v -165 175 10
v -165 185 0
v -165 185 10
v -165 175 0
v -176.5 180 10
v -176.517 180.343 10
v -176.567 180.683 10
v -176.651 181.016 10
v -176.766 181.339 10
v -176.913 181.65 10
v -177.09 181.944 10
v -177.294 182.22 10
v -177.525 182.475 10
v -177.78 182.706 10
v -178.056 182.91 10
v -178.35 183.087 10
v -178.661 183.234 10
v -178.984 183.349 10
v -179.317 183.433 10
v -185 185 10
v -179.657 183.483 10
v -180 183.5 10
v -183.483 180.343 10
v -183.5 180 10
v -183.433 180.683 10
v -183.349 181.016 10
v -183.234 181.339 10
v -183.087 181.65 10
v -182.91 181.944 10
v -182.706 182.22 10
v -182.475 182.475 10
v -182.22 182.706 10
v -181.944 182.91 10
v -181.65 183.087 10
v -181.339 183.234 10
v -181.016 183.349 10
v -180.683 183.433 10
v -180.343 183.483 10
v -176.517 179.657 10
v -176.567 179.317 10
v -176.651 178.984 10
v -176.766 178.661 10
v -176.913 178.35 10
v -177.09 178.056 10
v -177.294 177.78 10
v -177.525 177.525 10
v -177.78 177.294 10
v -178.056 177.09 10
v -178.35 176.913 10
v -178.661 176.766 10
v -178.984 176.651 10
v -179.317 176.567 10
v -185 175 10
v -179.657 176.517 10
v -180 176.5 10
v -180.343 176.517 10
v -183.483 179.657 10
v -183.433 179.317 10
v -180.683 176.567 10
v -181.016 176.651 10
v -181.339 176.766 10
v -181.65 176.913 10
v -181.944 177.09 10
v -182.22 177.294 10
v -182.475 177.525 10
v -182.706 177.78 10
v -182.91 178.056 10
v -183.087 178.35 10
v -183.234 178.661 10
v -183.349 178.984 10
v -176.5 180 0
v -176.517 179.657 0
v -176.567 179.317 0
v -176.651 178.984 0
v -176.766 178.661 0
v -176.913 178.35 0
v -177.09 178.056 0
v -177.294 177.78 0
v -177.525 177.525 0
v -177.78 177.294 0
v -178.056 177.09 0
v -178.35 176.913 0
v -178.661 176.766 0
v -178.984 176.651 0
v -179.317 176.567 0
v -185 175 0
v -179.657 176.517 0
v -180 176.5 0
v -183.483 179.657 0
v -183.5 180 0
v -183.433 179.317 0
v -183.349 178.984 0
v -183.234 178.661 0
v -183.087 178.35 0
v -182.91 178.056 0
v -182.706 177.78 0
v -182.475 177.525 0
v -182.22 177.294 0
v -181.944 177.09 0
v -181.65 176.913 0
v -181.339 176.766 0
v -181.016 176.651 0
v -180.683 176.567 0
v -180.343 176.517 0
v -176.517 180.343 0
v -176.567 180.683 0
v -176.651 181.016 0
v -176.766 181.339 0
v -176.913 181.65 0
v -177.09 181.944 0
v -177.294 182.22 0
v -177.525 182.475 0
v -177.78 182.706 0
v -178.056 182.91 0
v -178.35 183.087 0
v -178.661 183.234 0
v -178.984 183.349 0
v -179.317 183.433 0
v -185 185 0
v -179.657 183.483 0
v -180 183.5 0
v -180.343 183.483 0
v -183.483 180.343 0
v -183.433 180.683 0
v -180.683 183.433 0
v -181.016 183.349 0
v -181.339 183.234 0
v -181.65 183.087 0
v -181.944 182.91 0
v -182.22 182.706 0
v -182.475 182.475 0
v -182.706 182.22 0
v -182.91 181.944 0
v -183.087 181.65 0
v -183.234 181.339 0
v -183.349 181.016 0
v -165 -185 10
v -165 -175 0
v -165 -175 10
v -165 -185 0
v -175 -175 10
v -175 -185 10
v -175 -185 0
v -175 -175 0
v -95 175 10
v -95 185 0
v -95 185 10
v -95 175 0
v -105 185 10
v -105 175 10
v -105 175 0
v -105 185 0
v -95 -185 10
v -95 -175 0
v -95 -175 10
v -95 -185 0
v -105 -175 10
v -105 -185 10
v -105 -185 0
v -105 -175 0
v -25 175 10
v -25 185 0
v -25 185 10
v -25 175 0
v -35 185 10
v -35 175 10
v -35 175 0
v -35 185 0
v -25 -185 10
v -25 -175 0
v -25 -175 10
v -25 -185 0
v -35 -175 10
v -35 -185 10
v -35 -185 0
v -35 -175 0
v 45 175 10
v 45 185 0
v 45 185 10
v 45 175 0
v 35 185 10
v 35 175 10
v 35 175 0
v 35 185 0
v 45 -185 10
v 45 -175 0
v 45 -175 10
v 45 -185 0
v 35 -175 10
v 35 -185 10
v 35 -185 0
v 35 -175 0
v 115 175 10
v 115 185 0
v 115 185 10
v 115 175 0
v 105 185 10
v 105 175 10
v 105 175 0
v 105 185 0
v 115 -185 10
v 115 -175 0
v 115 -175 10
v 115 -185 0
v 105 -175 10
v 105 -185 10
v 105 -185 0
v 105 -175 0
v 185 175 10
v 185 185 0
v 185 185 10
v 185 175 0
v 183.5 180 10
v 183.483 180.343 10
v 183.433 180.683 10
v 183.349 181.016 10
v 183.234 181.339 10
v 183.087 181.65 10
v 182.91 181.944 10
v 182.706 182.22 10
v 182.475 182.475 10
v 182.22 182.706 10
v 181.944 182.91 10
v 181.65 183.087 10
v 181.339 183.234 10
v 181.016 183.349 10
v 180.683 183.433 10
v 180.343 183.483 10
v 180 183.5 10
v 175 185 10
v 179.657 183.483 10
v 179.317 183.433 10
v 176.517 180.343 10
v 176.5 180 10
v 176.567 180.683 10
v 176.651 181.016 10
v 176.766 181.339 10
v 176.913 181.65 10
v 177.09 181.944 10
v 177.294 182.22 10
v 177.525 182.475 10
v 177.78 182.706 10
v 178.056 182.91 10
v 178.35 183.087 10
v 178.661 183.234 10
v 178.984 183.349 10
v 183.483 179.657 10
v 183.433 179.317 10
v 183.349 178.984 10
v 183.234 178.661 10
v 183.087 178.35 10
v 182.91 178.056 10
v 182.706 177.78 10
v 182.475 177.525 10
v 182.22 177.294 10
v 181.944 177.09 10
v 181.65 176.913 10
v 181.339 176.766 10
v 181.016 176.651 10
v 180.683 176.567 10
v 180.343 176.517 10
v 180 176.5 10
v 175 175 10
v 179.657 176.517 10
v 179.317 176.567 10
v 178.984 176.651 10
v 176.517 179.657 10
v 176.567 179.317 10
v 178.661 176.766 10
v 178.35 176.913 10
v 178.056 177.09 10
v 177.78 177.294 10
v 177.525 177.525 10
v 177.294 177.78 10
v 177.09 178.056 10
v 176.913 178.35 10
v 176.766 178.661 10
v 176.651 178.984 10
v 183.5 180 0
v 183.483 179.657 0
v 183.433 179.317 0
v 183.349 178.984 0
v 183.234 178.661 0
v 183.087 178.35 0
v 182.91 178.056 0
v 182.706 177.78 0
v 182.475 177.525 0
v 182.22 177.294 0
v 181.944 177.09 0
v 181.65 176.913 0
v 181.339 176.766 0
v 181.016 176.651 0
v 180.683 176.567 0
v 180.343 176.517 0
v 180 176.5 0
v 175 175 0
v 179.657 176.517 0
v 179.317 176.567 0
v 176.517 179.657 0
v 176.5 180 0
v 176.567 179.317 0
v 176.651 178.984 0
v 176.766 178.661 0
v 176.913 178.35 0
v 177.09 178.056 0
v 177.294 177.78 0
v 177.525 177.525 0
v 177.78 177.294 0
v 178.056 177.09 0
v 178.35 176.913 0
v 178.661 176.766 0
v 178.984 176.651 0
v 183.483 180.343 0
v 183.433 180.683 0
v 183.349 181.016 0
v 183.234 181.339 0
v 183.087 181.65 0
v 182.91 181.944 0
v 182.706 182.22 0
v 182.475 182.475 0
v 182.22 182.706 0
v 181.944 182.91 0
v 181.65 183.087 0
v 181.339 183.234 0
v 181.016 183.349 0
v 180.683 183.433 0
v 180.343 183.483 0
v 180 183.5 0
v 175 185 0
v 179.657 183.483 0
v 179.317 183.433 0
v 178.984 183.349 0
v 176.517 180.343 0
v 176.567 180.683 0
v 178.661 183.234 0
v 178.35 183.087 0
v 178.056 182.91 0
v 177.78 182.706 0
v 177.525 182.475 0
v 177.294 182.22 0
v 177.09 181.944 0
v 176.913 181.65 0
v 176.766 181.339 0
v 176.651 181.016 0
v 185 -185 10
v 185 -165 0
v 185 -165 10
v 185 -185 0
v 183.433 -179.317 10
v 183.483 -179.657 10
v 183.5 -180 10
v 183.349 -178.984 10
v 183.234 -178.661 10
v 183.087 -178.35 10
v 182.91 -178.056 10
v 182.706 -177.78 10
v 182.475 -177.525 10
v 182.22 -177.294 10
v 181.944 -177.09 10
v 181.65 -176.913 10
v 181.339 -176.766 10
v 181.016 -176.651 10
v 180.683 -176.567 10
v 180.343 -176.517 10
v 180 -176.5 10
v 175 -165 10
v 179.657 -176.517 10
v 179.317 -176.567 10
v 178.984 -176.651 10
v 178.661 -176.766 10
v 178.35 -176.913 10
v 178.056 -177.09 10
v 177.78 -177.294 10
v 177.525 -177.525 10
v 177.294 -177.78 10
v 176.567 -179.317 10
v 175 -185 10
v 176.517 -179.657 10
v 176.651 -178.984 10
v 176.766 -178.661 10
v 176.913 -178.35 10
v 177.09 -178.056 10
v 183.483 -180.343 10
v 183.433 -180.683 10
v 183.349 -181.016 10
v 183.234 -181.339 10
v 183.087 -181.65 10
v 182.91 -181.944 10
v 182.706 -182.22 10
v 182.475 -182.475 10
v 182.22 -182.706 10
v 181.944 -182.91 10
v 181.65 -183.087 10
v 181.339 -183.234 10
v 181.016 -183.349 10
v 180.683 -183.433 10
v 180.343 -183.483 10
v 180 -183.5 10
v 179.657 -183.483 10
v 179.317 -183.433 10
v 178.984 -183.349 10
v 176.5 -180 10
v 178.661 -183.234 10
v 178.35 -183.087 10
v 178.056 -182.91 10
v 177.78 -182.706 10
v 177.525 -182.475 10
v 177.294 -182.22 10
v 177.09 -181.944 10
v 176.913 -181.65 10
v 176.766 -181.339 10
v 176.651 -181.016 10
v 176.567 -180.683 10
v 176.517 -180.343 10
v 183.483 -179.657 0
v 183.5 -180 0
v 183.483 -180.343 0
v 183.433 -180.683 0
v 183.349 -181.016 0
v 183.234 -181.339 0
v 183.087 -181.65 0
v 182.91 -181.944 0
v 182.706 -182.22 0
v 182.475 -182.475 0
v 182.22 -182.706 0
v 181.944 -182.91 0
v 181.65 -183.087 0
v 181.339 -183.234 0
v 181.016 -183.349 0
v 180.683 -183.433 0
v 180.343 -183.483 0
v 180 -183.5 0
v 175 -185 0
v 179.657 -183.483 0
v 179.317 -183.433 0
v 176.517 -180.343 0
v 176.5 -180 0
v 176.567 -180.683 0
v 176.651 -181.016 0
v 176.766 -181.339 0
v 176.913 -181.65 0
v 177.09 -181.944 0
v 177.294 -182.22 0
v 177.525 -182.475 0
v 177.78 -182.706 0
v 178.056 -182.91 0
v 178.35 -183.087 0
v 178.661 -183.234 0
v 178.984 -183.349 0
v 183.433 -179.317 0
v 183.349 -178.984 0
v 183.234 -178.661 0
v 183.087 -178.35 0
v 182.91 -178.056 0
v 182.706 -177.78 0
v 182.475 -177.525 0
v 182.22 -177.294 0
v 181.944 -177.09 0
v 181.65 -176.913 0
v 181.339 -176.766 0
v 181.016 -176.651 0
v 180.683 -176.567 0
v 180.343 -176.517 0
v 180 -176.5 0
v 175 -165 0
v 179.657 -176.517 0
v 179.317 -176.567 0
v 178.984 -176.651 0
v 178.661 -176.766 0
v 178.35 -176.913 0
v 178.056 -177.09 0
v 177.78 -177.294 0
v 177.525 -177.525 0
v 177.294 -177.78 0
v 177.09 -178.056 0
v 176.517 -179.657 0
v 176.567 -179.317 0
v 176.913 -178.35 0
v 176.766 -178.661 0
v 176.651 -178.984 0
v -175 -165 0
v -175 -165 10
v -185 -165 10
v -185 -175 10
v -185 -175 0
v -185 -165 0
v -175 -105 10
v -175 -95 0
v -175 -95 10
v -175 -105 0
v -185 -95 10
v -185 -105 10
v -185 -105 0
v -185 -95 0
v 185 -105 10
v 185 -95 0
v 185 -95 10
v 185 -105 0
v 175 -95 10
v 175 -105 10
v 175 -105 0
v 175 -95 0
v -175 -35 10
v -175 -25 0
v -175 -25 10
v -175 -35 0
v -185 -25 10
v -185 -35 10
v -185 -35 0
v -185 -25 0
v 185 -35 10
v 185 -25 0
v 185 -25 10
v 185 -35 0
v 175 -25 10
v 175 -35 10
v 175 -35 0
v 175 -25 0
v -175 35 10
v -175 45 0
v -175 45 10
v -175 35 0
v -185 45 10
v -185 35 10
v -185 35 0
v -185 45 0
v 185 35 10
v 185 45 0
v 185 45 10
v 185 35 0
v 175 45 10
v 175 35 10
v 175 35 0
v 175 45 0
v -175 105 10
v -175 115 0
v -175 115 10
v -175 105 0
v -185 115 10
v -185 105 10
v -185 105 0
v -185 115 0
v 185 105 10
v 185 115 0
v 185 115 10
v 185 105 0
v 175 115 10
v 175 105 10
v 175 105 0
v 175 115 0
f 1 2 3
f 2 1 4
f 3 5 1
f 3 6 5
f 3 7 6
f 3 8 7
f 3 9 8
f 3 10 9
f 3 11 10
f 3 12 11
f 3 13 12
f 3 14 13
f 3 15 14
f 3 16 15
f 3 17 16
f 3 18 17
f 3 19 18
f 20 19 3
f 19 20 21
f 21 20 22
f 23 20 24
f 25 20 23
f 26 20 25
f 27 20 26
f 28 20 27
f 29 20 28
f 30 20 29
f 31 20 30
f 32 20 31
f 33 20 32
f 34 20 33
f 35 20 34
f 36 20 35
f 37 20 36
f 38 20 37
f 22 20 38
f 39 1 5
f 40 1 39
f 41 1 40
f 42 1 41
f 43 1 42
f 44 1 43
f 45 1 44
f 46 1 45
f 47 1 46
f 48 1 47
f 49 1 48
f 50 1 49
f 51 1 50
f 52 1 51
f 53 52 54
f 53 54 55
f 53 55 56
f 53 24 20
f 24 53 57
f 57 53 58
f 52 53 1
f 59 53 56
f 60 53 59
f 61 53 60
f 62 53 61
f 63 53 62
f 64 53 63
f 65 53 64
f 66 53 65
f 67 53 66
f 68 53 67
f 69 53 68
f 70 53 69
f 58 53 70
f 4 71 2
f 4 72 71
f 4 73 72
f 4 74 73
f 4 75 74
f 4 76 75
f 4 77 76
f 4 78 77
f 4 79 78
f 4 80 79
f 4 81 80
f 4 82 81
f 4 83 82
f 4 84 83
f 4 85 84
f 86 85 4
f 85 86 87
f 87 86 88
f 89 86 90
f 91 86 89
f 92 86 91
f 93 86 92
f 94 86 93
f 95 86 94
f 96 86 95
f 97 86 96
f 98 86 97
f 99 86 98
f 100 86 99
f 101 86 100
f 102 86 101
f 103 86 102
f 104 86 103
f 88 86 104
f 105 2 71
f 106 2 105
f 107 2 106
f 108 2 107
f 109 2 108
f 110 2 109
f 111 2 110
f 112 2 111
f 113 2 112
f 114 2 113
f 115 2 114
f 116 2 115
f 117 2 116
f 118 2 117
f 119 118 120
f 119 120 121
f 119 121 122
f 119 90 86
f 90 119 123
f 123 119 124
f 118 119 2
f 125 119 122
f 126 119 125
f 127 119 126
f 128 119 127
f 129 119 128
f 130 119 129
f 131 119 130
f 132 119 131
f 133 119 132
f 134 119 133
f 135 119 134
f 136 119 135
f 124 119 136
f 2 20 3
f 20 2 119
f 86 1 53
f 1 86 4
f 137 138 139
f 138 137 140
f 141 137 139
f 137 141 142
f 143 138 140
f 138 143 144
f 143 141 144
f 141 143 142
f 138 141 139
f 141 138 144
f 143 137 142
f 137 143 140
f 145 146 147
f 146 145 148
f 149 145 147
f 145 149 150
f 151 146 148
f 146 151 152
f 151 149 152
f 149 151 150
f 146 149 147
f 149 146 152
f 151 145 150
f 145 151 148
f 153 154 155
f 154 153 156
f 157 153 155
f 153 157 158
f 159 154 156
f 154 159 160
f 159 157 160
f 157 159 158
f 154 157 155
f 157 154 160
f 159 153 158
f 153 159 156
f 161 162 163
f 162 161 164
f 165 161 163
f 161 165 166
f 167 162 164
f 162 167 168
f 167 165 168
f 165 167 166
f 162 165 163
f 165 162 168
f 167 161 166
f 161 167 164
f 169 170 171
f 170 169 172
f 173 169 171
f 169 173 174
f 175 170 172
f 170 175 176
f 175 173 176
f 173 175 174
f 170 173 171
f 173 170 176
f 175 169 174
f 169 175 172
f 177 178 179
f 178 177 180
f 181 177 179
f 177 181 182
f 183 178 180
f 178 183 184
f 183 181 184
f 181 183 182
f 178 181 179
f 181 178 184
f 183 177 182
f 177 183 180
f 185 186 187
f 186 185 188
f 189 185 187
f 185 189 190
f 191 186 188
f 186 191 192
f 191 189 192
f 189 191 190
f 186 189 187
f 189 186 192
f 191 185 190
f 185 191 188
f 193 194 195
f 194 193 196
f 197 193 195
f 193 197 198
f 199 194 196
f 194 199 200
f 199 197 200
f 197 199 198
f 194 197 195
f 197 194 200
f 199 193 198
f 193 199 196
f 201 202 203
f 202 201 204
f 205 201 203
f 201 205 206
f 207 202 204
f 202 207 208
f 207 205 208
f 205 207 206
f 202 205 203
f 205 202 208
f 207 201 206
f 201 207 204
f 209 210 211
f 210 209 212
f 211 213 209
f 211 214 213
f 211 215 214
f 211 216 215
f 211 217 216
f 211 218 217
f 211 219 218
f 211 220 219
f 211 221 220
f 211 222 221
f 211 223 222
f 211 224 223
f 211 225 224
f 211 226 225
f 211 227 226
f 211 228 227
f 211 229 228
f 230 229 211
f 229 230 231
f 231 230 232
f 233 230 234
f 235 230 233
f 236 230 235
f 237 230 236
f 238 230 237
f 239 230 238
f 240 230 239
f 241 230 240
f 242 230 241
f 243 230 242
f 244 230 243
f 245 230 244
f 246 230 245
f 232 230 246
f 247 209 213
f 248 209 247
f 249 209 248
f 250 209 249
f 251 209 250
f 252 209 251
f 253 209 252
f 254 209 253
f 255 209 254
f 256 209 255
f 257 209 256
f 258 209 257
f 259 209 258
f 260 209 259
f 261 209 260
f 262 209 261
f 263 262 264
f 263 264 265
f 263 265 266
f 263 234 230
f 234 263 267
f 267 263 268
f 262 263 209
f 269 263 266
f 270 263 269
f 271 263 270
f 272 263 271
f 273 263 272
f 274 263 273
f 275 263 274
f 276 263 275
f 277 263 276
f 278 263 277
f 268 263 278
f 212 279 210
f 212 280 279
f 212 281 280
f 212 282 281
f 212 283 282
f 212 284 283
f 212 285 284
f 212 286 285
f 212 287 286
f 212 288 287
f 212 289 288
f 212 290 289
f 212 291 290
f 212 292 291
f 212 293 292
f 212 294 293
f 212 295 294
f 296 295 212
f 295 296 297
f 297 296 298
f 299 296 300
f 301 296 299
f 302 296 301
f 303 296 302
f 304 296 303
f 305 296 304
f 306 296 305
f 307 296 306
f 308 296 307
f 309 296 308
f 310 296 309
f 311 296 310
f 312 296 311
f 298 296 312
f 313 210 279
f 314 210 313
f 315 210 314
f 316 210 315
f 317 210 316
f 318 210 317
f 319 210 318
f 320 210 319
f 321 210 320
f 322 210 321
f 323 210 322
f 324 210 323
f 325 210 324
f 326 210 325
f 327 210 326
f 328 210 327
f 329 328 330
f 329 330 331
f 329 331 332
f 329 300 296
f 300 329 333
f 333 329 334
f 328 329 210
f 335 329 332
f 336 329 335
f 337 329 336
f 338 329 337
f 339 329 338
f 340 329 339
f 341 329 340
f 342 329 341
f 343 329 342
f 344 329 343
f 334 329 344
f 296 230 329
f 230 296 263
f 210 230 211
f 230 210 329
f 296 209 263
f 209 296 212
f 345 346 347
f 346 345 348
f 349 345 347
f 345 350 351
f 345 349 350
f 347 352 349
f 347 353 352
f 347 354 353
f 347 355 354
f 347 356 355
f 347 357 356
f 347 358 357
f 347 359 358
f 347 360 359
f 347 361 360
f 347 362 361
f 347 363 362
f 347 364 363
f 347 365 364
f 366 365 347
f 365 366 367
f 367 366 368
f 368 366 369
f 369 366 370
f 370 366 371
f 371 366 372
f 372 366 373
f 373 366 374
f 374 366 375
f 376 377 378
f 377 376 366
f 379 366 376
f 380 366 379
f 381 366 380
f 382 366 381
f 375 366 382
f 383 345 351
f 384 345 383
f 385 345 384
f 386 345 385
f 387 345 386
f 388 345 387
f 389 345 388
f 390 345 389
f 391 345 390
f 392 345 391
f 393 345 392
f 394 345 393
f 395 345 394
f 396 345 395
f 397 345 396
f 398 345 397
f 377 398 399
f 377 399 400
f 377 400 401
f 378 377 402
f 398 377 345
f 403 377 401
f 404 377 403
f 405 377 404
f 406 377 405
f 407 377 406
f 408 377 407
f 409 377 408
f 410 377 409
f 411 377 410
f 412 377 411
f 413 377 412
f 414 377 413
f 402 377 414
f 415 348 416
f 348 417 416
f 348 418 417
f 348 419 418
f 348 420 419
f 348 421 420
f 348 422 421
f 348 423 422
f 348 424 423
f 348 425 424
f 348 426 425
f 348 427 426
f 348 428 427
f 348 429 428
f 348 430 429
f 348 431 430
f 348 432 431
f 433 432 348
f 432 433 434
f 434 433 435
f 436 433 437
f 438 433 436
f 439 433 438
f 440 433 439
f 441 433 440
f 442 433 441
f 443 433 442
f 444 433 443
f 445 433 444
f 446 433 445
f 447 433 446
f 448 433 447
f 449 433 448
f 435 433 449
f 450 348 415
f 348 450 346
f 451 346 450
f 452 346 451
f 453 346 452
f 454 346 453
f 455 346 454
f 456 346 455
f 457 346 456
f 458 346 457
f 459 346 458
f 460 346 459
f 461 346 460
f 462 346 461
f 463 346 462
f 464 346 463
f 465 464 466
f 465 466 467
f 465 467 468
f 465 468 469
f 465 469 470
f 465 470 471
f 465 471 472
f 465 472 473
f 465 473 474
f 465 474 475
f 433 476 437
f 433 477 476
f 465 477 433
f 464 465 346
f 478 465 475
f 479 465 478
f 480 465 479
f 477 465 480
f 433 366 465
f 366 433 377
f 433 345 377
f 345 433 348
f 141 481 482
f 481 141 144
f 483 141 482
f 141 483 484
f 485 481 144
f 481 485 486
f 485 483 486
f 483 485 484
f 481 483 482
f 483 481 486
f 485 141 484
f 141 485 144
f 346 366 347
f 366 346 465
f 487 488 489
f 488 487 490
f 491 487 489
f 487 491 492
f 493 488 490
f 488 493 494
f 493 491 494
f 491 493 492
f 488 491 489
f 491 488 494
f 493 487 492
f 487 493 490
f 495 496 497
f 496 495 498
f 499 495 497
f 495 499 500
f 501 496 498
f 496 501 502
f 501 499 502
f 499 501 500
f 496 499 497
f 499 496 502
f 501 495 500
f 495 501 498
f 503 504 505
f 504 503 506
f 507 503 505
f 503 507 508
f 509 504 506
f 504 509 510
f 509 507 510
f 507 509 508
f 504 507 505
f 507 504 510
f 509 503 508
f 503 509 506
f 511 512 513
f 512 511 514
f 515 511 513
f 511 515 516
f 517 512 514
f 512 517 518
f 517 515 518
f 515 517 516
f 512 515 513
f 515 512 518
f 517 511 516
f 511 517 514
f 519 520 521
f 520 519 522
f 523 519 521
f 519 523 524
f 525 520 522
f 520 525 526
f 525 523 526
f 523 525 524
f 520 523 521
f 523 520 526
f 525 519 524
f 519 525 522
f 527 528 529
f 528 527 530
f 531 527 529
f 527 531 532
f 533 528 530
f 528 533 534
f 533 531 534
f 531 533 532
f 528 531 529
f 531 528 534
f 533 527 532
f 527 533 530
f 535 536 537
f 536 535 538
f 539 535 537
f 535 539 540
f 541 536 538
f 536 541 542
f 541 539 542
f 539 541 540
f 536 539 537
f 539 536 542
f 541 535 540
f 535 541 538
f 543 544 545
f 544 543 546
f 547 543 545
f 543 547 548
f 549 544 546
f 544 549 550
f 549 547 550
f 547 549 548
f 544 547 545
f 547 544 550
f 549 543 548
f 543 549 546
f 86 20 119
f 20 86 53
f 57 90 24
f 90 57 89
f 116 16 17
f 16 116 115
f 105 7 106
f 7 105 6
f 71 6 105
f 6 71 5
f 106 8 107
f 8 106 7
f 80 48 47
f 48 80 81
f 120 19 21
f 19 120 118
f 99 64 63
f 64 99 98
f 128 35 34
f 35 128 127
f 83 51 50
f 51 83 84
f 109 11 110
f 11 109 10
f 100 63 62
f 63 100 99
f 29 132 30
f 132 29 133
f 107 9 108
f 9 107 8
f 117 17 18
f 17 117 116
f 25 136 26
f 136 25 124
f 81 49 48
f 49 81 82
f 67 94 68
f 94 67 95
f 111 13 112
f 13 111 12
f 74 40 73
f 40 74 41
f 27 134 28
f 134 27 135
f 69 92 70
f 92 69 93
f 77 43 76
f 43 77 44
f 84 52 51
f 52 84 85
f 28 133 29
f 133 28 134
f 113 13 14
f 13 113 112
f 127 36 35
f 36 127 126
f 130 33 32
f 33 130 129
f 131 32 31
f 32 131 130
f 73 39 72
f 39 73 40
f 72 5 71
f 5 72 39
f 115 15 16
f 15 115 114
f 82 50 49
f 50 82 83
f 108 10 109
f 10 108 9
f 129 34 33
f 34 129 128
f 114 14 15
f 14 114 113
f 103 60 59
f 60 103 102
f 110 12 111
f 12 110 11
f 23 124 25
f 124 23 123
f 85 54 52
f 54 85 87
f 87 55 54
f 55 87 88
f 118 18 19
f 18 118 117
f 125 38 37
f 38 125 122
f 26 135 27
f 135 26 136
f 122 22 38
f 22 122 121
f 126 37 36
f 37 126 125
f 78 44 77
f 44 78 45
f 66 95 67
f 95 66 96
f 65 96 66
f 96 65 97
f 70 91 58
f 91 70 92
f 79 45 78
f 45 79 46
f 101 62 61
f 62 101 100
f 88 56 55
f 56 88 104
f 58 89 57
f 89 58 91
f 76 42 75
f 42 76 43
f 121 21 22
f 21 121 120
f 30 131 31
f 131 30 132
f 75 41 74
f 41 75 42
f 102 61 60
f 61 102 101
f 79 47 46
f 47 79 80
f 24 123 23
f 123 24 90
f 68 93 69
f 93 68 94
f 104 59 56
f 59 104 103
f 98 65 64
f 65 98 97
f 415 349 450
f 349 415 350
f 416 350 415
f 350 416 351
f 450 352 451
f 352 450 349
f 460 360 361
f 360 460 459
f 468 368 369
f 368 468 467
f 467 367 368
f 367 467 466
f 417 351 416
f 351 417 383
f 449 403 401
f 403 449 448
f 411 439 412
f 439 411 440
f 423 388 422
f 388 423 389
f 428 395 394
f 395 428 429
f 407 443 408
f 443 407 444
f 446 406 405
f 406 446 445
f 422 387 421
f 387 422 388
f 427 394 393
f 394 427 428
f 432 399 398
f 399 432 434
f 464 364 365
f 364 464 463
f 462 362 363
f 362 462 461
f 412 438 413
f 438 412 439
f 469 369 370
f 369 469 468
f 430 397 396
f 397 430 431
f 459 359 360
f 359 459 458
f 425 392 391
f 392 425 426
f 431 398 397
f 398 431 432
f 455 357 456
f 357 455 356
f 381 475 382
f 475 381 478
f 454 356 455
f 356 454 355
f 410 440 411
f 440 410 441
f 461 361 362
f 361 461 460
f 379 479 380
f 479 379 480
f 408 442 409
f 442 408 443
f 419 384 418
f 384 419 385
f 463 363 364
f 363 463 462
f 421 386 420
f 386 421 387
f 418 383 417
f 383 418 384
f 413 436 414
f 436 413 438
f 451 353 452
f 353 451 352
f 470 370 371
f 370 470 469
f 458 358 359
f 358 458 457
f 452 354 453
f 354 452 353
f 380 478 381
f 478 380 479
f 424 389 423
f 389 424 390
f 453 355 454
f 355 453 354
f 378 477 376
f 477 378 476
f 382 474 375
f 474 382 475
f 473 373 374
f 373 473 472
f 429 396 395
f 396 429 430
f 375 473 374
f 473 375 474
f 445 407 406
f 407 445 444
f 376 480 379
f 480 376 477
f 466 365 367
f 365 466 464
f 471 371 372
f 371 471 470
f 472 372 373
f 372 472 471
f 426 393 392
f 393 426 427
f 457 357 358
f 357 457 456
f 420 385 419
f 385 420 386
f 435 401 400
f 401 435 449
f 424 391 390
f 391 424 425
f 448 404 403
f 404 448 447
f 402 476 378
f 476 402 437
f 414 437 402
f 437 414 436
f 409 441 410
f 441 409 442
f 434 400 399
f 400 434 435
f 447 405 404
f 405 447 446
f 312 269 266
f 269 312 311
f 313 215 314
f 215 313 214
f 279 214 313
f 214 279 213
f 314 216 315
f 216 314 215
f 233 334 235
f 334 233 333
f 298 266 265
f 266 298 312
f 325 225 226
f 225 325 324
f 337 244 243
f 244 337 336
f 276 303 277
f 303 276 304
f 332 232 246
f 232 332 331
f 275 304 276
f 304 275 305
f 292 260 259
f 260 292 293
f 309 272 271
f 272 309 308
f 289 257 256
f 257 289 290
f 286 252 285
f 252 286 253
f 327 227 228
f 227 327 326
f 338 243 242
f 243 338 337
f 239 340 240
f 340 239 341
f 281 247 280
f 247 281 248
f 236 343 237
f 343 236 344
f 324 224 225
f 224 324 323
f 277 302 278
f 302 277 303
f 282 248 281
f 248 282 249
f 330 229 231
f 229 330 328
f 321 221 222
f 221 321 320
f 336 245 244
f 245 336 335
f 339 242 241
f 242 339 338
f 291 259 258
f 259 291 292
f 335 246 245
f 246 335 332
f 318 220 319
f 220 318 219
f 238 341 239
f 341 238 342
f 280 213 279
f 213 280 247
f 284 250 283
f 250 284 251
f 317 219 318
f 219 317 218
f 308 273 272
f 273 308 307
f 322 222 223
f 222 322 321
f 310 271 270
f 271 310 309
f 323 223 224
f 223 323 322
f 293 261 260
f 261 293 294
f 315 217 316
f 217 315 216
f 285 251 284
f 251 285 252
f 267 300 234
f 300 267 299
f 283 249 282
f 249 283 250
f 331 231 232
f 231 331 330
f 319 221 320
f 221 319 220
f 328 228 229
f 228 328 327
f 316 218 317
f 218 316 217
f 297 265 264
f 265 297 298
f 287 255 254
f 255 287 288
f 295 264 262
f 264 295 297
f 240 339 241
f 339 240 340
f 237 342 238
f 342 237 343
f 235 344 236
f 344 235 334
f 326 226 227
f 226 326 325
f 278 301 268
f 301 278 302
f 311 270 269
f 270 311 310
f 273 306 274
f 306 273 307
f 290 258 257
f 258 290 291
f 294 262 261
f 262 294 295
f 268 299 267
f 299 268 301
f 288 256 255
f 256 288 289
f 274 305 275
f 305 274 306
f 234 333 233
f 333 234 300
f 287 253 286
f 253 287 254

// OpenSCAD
// ring_35.scad - ring index 35 (z bottom = 350 mm)
$fn = 64; bar = 10; half_b = bar/2; outer = 370; half_outer = outer/2;
front_y = 180; back_y = -180; left_x = -180; right_x = 180;
x_centers = [-170, -100, -30, 40, 110, 180];
z_centers = [5, 85, 155, 225, 295, 365, 435, 505, 575, 645, 715]; ring_z = 350;
module place_box(cx, cy, sx, sy) { translate([cx - sx/2, cy - sy/2, 0]) cube([sx, sy, bar]); }

difference() { union() {
    for (x = x_centers) { place_box(x, front_y, bar, bar); place_box(x, back_y, bar, bar); }
    for (y = x_centers) { place_box(left_x, y, bar, bar); place_box(right_x, y, bar, bar); }
    for (zc = z_centers) if ((zc - half_b < ring_z + bar) && (zc + half_b > ring_z)) {
        translate([-half_outer, front_y - half_b, 0]) cube([outer, bar, bar]);
        translate([-half_outer, back_y - half_b, 0])  cube([outer, bar, bar]);
        translate([left_x - half_b, -half_outer, 0])  cube([bar, outer, bar]);
        translate([right_x - half_b, -half_outer, 0]) cube([bar, outer, bar]);
    }
  }
  for (cx = [-180, 180]) for (cy = [-180, 180]) translate([cx, cy, 0]) cylinder(h = bar, r = 3.5, $fn = 64);
}
